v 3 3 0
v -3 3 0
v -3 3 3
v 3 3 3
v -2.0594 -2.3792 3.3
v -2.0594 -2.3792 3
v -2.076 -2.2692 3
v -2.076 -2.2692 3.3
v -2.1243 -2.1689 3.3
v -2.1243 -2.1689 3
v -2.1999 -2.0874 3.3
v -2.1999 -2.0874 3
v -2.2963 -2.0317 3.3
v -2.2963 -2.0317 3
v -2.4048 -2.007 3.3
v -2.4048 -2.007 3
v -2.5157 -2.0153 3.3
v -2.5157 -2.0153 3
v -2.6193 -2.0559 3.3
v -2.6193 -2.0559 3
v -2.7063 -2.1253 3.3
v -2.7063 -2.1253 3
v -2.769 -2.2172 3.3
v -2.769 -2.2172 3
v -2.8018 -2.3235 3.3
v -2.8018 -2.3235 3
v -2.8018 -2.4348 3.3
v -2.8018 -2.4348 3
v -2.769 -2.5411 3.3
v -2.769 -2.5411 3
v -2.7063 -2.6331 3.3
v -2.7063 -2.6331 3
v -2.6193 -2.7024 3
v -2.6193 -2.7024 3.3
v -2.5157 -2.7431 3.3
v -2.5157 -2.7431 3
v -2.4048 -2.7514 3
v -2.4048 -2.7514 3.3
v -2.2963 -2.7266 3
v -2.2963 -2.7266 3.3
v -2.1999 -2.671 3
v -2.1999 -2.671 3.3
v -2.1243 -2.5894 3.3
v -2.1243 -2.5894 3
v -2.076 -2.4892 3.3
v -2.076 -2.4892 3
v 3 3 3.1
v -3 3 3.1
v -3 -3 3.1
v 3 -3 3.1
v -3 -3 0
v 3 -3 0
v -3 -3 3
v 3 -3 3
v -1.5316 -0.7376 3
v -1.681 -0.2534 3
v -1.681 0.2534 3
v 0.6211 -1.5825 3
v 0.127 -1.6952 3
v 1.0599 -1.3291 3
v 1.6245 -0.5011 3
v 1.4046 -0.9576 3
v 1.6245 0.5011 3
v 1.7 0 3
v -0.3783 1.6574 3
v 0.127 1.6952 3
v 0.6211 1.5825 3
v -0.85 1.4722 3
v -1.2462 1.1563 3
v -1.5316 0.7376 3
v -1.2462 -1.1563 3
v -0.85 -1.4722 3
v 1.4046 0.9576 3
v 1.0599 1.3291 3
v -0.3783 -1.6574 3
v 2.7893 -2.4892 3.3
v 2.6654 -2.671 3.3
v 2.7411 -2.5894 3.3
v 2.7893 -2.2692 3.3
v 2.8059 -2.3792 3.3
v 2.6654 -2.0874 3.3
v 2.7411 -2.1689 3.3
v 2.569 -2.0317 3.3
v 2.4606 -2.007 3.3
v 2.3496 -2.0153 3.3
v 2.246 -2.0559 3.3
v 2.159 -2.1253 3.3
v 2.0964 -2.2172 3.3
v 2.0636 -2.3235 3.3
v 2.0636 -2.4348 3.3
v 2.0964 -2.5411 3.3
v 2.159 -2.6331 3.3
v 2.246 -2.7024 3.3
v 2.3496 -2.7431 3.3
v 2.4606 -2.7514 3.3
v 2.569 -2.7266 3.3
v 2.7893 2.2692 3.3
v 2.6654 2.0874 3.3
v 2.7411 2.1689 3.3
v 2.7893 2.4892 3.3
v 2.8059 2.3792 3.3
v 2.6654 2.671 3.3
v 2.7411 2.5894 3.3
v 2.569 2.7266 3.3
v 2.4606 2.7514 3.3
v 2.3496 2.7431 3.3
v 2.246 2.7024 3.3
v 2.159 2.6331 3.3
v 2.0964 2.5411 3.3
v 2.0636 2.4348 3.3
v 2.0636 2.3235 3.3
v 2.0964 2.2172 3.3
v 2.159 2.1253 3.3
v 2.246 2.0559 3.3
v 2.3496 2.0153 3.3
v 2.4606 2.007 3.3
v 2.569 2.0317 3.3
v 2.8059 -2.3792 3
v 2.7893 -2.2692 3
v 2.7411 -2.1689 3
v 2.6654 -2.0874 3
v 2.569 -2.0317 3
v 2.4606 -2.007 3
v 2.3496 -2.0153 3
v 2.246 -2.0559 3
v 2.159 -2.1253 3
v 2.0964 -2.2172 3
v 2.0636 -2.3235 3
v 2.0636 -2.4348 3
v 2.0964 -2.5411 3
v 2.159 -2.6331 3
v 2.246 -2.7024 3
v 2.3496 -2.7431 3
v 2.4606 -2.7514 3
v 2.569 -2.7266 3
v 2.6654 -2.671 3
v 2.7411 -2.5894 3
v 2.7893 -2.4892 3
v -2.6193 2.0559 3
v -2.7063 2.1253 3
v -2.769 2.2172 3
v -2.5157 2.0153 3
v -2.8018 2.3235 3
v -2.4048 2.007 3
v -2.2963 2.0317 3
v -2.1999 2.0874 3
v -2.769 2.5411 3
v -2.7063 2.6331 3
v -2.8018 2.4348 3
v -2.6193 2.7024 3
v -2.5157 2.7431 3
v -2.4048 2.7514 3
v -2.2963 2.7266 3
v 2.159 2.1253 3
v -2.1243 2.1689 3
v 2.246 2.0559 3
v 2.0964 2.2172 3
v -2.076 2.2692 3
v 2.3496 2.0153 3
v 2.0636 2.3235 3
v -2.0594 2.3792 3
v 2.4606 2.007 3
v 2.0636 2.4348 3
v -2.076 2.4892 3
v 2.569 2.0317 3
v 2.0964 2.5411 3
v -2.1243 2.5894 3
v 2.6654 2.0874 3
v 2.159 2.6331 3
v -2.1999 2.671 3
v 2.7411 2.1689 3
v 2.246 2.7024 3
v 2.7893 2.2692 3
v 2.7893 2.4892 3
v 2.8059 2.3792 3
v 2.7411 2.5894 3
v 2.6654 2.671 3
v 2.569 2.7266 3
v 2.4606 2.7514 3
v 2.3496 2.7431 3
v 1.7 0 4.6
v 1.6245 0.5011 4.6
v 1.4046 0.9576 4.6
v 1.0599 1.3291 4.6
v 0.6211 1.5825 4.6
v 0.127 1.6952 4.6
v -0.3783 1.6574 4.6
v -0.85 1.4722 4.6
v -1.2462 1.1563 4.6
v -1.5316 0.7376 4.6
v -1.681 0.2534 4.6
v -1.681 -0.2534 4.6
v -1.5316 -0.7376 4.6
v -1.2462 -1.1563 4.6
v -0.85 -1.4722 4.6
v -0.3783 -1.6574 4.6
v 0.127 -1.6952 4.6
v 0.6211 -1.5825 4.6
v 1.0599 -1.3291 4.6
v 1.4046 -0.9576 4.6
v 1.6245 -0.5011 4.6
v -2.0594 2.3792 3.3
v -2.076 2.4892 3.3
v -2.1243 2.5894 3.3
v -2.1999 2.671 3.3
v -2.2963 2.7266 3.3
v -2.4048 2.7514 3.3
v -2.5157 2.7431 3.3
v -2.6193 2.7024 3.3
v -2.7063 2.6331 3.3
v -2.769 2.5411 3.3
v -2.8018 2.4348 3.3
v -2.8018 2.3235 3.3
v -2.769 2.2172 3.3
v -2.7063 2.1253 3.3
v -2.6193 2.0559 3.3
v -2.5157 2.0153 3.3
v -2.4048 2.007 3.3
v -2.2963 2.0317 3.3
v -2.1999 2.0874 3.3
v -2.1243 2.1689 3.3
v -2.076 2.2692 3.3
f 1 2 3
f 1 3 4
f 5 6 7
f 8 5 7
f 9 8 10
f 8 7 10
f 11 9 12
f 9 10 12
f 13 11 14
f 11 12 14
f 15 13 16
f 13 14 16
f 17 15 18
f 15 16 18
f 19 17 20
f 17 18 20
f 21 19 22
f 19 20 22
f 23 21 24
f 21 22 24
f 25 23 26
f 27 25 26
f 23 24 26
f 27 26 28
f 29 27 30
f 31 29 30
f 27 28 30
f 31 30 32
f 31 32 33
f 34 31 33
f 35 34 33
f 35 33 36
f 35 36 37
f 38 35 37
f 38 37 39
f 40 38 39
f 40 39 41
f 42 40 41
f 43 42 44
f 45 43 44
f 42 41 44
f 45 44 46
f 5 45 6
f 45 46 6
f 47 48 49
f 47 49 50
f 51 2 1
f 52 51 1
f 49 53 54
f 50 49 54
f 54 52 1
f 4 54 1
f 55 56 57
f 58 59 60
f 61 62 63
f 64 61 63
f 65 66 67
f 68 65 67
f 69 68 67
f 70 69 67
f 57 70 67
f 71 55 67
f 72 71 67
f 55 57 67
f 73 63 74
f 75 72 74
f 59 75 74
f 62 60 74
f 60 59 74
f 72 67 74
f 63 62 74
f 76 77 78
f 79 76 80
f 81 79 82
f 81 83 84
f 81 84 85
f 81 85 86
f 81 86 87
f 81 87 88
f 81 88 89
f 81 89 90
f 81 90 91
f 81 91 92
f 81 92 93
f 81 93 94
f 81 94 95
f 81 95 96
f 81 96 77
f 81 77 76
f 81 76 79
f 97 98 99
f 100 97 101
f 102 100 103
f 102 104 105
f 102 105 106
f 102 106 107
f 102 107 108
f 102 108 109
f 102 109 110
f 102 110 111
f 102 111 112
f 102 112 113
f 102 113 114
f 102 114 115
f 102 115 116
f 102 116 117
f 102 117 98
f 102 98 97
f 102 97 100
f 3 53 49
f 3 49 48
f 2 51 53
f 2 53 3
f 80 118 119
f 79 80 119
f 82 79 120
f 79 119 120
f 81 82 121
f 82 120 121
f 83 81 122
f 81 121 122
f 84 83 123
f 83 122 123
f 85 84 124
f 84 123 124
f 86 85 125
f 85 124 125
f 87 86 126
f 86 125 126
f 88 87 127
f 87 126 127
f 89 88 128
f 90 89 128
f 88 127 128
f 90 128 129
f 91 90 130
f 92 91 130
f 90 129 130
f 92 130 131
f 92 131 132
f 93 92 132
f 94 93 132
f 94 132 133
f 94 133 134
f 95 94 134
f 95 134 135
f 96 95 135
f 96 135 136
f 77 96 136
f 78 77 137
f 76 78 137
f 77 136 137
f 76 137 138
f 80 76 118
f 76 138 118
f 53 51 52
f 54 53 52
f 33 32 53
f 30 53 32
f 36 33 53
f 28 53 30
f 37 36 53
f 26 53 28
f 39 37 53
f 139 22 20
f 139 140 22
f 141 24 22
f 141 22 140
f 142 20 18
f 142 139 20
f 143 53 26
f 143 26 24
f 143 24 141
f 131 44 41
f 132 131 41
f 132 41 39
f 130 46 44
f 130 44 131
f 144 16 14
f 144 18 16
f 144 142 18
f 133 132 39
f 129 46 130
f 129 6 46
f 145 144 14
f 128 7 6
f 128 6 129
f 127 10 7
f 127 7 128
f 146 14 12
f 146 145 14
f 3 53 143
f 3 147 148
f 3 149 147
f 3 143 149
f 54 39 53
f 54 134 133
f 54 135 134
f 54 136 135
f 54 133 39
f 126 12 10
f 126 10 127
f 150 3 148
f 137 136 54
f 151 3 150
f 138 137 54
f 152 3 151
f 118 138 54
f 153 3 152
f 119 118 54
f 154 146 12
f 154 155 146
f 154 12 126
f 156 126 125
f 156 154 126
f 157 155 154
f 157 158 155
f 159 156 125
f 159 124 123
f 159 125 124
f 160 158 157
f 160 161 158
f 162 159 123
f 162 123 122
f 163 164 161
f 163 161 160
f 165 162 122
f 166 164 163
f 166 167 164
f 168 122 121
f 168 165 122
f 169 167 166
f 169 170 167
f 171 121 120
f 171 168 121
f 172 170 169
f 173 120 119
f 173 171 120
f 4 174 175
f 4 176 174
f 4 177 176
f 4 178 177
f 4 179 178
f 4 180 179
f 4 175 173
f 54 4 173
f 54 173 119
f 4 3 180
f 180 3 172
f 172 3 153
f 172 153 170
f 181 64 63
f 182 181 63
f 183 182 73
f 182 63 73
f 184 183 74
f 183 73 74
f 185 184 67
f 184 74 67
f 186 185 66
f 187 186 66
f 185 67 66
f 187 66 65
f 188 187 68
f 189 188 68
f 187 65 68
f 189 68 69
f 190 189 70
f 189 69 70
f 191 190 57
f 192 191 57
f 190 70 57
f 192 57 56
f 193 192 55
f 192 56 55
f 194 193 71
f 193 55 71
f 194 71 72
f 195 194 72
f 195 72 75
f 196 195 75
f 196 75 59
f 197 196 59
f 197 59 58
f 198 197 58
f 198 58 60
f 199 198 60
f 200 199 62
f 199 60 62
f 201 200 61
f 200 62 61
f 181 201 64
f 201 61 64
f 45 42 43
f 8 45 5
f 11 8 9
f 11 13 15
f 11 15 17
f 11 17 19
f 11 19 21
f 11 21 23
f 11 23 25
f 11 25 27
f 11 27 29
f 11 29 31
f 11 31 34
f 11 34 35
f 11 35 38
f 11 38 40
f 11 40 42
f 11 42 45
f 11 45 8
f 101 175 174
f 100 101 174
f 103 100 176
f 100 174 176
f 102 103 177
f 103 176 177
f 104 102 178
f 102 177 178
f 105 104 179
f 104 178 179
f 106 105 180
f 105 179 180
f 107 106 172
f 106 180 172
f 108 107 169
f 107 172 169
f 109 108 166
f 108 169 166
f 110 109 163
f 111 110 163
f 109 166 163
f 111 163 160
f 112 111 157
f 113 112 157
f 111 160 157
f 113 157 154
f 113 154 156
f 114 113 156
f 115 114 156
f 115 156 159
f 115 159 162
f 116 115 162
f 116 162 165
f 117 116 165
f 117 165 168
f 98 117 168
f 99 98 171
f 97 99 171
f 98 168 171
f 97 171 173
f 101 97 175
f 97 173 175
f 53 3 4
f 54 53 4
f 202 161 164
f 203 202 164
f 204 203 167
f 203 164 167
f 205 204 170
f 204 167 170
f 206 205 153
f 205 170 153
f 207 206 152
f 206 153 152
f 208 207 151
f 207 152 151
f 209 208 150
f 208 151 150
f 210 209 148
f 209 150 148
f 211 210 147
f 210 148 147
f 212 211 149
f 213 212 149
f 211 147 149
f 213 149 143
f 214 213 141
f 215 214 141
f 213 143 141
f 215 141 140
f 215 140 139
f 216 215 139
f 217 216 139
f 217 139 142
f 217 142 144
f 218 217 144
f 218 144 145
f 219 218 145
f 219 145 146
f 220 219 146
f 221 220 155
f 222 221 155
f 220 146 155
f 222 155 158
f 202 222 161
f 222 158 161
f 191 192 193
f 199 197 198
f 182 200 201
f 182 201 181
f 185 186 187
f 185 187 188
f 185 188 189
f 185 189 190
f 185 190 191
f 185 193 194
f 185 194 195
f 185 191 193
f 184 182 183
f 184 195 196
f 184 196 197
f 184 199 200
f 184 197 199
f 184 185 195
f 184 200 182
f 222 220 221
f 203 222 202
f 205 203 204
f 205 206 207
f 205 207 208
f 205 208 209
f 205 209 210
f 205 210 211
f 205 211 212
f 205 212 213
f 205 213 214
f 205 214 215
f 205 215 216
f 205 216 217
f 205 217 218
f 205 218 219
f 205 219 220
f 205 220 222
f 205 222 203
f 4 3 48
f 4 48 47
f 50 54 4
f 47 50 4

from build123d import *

# Parameters (mm, degrees)
F0_W     = 6
F0_H     = 6
F1_DEPTH = 3
F2_R     = 1.7
F3_DEPTH = 1.6
F4_DEPTH = 0.1
F2_R_2   = 0.3732558786
F5_DEPTH = 0.3


with BuildPart() as f1:
    # F0 (on Top) → F1 (new body)
    with BuildSketch(Plane.XY):
        Rectangle(F0_W, F0_H)
    extrude(amount=F1_DEPTH)


with BuildPart() as f3:
    # F2 (on face) → F3 (new body)
    with BuildSketch(Plane.XY.offset(3)):
        Circle(F2_R)
    extrude(amount=F3_DEPTH)


with BuildPart() as f4:
    # F4 (new): a face of the model
    f4_faces = [f1.part.faces().sort_by_distance(p)[0] for p in [
        (0, 0, 3),
    ]]
    extrude(f4_faces, amount=F4_DEPTH)


with BuildPart() as f1_1:
    add(f1.part)

    # F2 (on face) → F5 (join)
    with BuildSketch(Plane.XY.offset(3)):
        with Locations((-2.4326657876, -2.379177371)):
            Circle(F2_R_2)
        with Locations((2.4326657876, -2.379177371)):
            Circle(F2_R_2)
        with Locations((2.4326657876, 2.379177371)):
            Circle(F2_R_2)
        with Locations((-2.4326657876, 2.379177371)):
            Circle(F2_R_2)
    extrude(amount=F5_DEPTH)


solid = Compound([f3.part, f4.part, f1_1.part])
